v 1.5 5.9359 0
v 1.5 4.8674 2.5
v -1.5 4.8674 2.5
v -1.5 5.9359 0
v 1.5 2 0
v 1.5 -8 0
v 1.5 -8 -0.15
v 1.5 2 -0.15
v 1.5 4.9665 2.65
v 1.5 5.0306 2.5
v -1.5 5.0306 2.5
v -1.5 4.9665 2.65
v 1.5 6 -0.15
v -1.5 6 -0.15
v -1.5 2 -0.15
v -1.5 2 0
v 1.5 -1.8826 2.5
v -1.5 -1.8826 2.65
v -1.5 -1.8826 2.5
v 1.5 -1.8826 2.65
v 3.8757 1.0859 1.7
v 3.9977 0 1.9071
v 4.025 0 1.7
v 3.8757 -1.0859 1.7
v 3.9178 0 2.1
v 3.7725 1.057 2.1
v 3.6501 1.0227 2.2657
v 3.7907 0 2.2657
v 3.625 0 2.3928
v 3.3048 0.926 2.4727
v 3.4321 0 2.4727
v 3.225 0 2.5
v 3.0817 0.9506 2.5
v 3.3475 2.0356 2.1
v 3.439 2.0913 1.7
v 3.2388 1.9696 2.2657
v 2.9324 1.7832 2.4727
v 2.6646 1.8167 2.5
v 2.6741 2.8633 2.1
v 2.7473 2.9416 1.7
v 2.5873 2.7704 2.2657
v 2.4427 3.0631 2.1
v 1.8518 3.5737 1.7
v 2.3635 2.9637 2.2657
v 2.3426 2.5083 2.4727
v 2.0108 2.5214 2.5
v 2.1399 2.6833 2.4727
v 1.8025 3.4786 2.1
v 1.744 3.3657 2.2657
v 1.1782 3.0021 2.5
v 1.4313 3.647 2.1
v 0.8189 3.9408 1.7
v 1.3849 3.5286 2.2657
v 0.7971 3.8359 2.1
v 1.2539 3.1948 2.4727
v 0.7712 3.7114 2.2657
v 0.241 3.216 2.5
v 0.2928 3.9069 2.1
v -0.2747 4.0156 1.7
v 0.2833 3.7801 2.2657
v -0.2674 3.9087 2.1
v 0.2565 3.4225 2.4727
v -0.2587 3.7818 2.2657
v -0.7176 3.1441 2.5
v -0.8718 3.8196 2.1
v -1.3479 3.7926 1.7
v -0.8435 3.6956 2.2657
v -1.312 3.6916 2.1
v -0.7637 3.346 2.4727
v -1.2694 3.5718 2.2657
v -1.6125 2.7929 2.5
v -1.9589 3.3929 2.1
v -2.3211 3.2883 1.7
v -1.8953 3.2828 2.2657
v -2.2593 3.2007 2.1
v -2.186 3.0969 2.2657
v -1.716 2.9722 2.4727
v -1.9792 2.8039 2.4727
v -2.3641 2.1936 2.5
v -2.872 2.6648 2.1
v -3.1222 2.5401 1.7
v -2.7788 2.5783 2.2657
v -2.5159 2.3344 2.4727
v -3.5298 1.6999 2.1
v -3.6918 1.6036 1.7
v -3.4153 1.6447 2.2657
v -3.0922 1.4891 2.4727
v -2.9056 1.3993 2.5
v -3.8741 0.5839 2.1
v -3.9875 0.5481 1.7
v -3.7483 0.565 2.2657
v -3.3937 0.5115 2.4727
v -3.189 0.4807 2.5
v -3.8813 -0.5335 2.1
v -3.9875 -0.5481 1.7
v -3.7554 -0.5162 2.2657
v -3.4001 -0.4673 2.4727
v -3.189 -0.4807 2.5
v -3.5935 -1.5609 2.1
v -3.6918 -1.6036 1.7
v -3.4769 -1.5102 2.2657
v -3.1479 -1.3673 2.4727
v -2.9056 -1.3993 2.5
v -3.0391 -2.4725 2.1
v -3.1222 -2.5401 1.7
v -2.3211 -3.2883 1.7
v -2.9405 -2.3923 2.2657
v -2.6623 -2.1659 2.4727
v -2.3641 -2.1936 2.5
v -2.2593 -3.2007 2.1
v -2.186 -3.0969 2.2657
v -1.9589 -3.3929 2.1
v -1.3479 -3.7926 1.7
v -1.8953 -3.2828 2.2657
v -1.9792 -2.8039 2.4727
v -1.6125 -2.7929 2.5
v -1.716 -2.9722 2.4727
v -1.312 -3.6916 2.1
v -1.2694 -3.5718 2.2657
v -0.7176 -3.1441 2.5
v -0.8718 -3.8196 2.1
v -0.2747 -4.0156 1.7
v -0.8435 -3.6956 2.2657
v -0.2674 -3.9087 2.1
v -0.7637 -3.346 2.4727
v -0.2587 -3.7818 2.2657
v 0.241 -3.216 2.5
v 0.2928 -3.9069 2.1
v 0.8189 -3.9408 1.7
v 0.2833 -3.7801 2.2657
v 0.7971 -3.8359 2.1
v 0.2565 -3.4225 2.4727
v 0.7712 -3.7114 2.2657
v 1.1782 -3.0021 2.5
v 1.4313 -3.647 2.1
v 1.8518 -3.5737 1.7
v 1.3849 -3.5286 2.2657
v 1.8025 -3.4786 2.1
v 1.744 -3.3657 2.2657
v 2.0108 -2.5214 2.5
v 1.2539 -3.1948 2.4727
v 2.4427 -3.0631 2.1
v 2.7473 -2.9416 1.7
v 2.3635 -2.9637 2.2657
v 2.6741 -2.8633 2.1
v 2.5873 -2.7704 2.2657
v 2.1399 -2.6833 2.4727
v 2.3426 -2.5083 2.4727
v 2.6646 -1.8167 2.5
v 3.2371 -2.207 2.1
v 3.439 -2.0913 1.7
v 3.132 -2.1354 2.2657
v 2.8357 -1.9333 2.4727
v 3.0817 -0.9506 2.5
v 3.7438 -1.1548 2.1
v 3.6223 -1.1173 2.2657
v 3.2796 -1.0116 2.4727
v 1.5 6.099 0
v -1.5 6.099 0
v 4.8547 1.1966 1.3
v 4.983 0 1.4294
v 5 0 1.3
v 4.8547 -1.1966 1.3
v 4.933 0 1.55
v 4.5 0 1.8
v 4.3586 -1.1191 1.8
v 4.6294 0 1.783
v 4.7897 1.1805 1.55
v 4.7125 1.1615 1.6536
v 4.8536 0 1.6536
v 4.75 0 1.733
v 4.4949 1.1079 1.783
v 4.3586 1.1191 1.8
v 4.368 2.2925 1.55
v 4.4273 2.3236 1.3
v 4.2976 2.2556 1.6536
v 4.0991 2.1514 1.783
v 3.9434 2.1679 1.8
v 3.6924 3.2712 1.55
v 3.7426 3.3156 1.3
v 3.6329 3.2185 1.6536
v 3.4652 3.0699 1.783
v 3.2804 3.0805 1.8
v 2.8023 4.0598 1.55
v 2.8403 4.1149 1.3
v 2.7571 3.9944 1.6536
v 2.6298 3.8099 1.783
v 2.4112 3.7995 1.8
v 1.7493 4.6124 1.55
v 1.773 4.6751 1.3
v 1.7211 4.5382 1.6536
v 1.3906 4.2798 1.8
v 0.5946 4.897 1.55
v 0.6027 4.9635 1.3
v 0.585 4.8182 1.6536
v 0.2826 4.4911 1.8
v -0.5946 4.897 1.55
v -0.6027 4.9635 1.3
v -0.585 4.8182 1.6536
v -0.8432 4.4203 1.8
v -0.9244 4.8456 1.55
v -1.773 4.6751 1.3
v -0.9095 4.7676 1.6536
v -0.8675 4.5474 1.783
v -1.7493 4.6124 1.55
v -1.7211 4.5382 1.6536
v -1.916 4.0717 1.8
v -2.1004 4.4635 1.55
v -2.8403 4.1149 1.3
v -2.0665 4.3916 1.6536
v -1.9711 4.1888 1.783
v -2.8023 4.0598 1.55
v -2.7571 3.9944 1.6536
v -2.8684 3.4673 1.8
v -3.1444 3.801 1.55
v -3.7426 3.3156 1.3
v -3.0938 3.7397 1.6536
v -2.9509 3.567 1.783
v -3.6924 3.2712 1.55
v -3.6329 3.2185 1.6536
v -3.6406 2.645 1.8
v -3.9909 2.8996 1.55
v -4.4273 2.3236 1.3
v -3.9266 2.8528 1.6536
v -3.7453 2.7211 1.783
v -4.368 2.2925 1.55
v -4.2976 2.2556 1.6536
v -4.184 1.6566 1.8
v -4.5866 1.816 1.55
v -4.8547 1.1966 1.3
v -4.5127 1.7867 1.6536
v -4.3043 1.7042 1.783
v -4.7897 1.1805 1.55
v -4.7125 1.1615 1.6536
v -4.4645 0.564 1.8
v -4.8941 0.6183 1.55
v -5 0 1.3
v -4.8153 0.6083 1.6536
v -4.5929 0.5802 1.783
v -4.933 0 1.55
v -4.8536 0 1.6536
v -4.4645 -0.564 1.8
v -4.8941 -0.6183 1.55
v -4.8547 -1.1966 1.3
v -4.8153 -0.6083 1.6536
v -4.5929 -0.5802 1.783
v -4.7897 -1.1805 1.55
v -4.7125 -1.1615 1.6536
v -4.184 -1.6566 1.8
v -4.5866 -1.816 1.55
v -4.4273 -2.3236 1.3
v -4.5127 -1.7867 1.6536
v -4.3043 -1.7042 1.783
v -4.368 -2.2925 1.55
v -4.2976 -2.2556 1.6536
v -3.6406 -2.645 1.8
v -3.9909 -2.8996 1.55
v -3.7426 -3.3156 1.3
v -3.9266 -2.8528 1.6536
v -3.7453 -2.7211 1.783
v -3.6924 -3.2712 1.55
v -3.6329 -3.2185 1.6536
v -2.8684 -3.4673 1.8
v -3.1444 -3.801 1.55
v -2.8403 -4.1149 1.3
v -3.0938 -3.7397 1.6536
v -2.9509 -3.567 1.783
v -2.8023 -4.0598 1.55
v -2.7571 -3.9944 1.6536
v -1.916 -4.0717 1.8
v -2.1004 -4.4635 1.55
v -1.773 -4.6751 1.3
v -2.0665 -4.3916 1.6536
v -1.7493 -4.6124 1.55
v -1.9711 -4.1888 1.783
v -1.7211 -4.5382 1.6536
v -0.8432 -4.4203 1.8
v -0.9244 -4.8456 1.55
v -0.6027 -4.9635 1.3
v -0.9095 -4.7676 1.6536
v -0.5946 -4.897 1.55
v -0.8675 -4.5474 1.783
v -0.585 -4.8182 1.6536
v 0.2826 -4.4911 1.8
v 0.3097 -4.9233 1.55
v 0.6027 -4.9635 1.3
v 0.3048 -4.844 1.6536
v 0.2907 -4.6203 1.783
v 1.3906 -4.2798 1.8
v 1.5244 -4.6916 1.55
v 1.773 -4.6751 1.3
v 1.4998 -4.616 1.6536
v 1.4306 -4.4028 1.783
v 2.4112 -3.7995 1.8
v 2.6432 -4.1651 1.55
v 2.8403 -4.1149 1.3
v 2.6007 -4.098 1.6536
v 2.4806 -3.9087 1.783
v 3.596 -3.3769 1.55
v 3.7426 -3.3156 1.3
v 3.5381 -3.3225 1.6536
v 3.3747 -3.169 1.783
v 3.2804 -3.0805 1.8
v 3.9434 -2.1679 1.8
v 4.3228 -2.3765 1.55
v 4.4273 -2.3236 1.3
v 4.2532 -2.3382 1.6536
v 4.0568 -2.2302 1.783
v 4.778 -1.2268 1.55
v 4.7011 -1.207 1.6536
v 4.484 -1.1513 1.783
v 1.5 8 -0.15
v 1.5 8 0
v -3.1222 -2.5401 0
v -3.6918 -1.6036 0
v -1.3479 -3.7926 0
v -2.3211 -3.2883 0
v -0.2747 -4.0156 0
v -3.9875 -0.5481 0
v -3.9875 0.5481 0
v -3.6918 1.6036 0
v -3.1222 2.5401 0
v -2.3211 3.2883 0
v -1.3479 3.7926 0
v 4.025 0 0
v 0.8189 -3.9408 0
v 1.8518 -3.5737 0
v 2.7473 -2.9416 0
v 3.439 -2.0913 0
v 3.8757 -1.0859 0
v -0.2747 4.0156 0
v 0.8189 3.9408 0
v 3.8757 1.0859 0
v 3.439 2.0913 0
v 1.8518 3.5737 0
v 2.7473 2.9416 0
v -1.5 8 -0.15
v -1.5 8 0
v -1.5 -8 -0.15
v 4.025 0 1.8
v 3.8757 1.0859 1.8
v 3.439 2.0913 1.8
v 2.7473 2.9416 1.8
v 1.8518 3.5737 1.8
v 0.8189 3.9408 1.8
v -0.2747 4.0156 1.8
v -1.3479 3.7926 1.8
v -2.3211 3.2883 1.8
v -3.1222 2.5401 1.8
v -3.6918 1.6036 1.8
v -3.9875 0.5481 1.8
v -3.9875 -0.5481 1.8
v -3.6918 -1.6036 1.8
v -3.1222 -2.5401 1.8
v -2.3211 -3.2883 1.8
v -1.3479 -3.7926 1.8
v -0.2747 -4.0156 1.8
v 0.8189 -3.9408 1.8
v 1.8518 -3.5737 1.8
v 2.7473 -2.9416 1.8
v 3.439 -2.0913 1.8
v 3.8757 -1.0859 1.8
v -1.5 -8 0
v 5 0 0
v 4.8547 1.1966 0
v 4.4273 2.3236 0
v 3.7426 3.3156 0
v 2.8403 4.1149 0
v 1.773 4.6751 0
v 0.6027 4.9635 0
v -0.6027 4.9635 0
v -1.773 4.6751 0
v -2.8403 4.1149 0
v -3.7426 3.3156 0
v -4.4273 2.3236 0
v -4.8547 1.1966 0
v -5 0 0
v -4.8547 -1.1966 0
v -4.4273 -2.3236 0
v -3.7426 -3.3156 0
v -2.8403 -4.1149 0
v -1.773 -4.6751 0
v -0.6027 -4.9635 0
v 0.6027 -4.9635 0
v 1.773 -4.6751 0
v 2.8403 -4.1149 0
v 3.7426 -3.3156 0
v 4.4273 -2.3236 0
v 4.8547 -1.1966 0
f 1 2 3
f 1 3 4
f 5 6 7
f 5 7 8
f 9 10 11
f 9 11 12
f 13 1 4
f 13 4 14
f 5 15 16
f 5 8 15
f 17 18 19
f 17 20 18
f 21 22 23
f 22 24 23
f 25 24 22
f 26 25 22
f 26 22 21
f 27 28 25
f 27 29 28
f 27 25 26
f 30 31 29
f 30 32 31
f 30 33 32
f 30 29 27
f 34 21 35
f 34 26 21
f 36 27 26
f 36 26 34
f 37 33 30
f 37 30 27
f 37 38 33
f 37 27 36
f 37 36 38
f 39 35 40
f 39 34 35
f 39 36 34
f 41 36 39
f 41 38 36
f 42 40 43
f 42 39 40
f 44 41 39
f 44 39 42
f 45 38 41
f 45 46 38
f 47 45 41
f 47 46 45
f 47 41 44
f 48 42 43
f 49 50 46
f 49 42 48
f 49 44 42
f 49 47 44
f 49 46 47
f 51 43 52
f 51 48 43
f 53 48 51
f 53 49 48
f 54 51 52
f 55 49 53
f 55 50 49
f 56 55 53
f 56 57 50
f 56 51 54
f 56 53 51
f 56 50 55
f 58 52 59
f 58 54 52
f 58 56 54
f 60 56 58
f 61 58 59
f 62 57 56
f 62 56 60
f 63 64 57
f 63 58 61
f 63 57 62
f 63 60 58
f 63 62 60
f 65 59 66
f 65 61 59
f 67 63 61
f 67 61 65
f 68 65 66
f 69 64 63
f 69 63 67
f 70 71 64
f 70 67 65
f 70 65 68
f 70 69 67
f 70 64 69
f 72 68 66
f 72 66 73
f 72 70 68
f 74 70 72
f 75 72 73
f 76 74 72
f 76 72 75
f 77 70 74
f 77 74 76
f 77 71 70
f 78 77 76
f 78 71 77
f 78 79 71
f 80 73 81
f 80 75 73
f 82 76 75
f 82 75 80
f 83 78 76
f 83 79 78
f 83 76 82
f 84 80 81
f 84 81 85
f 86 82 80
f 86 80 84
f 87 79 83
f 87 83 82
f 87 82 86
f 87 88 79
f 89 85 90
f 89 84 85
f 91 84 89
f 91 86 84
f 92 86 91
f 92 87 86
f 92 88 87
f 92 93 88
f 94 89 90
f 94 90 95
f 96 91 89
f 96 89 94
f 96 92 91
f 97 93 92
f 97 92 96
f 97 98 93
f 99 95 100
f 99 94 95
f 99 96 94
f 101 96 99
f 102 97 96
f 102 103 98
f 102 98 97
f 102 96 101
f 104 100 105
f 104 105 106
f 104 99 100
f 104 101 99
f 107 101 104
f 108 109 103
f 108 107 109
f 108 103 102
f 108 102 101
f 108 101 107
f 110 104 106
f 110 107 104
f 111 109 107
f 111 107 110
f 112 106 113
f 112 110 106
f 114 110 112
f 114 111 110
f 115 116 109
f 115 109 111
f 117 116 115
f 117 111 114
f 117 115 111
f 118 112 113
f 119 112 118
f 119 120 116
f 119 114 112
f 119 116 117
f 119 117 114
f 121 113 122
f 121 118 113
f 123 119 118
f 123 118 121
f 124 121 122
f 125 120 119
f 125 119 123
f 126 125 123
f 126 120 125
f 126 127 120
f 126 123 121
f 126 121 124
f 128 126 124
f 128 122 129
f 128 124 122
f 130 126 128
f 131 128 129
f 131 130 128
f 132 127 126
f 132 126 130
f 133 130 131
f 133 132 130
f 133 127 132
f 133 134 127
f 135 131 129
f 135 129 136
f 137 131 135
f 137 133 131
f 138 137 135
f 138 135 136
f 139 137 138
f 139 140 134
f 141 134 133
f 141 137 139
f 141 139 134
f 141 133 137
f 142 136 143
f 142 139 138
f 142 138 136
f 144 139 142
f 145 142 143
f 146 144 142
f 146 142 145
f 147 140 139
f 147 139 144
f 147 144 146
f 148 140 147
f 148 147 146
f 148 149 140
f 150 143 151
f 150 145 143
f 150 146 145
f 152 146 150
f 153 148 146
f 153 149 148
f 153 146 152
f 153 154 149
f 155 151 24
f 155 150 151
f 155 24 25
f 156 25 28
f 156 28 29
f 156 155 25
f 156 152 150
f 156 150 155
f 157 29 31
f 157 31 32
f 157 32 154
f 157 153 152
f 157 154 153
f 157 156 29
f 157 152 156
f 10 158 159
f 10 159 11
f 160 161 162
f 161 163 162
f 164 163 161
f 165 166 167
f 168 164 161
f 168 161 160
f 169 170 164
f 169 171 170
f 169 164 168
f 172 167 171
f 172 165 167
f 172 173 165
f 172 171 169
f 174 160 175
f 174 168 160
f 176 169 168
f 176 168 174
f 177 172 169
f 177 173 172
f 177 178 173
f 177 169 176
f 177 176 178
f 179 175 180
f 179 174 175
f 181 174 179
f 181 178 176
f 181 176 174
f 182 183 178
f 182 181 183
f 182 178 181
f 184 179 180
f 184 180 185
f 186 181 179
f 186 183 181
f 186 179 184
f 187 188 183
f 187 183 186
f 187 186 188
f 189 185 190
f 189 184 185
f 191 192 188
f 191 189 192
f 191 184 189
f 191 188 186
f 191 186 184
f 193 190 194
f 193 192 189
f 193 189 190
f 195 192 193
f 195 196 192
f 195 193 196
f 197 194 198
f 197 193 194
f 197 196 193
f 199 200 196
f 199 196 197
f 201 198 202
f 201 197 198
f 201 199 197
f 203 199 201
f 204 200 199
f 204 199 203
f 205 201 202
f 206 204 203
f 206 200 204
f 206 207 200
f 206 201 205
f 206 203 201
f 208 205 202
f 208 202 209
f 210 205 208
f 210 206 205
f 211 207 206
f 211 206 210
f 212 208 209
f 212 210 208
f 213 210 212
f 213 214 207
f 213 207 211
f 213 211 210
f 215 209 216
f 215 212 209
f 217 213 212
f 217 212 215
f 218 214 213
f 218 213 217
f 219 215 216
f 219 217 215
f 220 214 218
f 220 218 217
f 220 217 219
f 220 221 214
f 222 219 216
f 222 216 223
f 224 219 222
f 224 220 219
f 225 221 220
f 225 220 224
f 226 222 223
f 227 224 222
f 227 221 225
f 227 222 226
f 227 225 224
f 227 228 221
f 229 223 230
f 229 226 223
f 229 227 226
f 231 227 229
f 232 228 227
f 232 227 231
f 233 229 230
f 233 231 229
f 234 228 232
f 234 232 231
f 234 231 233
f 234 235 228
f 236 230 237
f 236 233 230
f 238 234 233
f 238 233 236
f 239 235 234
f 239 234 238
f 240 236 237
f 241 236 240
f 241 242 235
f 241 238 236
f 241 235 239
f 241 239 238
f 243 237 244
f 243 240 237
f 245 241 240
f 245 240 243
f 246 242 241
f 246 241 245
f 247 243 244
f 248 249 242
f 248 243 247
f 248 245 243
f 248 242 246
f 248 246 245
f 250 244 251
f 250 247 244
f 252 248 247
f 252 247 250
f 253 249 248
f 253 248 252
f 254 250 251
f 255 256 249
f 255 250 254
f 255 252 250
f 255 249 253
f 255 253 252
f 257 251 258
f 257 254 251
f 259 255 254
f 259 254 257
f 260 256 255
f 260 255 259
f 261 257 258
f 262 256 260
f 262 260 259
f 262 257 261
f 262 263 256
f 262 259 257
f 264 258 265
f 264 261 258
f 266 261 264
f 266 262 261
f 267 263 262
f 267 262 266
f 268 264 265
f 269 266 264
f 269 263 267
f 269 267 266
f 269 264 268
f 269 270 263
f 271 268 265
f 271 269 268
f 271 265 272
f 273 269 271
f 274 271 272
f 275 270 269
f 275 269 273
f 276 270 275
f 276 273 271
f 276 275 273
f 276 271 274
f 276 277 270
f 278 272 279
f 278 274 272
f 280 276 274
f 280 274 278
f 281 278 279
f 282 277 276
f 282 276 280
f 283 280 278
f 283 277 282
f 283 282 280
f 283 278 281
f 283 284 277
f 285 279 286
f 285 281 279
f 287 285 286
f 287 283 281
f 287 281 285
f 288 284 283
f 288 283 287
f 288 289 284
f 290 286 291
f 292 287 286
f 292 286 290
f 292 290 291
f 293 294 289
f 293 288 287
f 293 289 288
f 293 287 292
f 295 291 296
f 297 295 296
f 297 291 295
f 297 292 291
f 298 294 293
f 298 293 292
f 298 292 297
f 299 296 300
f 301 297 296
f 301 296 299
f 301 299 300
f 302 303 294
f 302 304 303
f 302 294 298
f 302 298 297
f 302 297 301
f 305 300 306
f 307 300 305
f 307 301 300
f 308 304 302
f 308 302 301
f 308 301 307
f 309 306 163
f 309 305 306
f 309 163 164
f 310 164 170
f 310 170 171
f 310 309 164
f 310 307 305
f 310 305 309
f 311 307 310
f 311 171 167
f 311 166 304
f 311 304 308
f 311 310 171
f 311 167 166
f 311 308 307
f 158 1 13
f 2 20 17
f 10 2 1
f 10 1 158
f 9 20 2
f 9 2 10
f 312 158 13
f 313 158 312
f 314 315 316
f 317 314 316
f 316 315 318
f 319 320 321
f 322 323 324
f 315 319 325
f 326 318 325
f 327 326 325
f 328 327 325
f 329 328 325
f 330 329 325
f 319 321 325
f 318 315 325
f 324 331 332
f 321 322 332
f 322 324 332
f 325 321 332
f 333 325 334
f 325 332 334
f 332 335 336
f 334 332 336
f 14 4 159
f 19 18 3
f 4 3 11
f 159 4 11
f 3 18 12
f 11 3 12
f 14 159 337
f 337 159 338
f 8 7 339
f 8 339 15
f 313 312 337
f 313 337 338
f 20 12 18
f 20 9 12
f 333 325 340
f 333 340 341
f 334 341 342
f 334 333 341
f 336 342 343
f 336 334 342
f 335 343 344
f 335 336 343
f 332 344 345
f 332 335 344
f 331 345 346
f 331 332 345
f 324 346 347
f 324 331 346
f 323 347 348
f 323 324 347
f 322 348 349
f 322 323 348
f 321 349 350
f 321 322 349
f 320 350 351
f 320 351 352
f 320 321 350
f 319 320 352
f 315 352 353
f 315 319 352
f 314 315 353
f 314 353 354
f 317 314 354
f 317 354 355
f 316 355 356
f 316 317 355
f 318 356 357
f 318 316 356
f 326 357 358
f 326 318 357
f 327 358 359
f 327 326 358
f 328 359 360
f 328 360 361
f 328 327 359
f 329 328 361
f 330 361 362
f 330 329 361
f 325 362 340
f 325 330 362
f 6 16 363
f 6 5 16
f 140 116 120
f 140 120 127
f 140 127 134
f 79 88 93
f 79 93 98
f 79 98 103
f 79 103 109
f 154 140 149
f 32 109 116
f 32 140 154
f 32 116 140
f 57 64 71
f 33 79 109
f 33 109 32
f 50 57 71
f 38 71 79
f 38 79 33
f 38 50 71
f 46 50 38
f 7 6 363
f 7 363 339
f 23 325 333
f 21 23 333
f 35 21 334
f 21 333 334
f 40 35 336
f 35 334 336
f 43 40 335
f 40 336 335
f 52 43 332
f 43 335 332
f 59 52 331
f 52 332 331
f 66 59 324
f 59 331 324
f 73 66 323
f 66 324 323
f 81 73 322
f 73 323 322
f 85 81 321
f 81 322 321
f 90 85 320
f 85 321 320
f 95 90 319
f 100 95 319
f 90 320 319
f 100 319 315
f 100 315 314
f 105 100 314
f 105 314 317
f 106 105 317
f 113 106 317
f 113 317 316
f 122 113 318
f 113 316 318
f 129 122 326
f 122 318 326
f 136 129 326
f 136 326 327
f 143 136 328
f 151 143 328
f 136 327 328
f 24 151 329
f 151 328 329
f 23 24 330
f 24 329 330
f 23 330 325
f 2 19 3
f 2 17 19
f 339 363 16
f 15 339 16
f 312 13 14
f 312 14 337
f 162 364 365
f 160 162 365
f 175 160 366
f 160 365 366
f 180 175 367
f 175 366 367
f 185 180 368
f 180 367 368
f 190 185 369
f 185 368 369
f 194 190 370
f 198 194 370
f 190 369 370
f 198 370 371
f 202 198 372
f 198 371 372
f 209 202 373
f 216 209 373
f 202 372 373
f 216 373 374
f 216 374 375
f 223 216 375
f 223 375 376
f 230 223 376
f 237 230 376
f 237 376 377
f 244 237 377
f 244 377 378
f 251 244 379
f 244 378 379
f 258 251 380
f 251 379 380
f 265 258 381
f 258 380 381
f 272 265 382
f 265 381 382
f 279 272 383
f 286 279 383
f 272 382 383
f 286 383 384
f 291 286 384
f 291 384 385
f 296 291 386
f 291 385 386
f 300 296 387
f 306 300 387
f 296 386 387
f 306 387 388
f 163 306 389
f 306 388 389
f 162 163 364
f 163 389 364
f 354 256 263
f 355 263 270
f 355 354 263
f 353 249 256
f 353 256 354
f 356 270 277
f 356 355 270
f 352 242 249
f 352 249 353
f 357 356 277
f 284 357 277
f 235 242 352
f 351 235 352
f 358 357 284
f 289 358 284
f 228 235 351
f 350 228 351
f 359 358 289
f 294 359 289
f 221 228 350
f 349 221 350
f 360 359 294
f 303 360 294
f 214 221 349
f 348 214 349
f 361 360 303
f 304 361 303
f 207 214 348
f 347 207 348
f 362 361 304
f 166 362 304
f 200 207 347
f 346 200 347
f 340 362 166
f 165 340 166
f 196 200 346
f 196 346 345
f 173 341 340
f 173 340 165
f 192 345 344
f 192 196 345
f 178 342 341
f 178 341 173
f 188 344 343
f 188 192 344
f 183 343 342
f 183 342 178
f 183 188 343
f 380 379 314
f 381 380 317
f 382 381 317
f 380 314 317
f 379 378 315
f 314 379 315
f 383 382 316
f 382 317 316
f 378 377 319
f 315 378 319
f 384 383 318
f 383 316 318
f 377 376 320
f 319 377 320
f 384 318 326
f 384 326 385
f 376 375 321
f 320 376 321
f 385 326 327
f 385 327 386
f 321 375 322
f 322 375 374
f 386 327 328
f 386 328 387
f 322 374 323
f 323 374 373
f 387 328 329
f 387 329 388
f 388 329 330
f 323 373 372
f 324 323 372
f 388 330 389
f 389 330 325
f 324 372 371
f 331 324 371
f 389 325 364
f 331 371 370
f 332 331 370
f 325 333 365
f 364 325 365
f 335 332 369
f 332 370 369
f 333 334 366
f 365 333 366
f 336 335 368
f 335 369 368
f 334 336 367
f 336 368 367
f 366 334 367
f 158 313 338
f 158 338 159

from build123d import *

# Parameters (mm, degrees)
F0_R     = 4.025
F1_DEPTH = 2.5
F0_R_2   = 5
F2_DEPTH = 1.8
F4_DEPTH = 1.5
F5_R     = 0.8
F6_R     = 0.5


with BuildPart() as f1:
    # F0 (on Top) → F1 (new body)
    with BuildSketch(Plane.XY):
        Circle(F0_R)
    extrude(amount=F1_DEPTH)

    # F5
    f5_edges = [f1.edges().sort_by_distance(p)[0] for p in [
        (-4.025, 0, 2.5),
    ]]
    fillet(f5_edges, radius=F5_R)


with BuildPart() as f2:
    # F0 (on Top) → F2 (new body)
    with BuildSketch(Plane.XY):
        Circle(F0_R_2)
        Circle(F0_R, mode=Mode.SUBTRACT)
    extrude(amount=F2_DEPTH)

    # F6
    f6_edges = [f2.edges().sort_by_distance(p)[0] for p in [
        (-5, 0, 1.8),
    ]]
    fillet(f6_edges, radius=F6_R)


with BuildPart() as f4:
    # F3 (on Right) → F4 (new body, symmetric)
    with BuildSketch(Plane.YZ):
        Polygon((-1.8825538568, 2.5), (0, 2.5), (4.8674461432, 2.5), (5.0305708949, 2.5), (4.9664640729, 2.65), (-1.8825538568, 2.65), align=None)
        Polygon((5.0305708949, 2.5), (4.8674461432, 2.5), (5.9358931779, 0), (6.0990179297, 0), align=None)
        Polygon((6.0990179297, 0), (5.9358931779, 0), (6, -0.15), (8, -0.15), (8, 0), align=None)
    extrude(amount=F4_DEPTH, both=True)


with BuildPart() as f4b:
    # F3 (on Right) → F4, piece 2 (new body, symmetric)
    with BuildSketch(Plane.YZ):
        Polygon((2, 0), (0, 0), (-8, 0), (-8, -0.15), (2, -0.15), align=None)
    extrude(amount=F4_DEPTH, both=True)


solid = Compound([f1.part, f2.part, f4.part, f4b.part])
